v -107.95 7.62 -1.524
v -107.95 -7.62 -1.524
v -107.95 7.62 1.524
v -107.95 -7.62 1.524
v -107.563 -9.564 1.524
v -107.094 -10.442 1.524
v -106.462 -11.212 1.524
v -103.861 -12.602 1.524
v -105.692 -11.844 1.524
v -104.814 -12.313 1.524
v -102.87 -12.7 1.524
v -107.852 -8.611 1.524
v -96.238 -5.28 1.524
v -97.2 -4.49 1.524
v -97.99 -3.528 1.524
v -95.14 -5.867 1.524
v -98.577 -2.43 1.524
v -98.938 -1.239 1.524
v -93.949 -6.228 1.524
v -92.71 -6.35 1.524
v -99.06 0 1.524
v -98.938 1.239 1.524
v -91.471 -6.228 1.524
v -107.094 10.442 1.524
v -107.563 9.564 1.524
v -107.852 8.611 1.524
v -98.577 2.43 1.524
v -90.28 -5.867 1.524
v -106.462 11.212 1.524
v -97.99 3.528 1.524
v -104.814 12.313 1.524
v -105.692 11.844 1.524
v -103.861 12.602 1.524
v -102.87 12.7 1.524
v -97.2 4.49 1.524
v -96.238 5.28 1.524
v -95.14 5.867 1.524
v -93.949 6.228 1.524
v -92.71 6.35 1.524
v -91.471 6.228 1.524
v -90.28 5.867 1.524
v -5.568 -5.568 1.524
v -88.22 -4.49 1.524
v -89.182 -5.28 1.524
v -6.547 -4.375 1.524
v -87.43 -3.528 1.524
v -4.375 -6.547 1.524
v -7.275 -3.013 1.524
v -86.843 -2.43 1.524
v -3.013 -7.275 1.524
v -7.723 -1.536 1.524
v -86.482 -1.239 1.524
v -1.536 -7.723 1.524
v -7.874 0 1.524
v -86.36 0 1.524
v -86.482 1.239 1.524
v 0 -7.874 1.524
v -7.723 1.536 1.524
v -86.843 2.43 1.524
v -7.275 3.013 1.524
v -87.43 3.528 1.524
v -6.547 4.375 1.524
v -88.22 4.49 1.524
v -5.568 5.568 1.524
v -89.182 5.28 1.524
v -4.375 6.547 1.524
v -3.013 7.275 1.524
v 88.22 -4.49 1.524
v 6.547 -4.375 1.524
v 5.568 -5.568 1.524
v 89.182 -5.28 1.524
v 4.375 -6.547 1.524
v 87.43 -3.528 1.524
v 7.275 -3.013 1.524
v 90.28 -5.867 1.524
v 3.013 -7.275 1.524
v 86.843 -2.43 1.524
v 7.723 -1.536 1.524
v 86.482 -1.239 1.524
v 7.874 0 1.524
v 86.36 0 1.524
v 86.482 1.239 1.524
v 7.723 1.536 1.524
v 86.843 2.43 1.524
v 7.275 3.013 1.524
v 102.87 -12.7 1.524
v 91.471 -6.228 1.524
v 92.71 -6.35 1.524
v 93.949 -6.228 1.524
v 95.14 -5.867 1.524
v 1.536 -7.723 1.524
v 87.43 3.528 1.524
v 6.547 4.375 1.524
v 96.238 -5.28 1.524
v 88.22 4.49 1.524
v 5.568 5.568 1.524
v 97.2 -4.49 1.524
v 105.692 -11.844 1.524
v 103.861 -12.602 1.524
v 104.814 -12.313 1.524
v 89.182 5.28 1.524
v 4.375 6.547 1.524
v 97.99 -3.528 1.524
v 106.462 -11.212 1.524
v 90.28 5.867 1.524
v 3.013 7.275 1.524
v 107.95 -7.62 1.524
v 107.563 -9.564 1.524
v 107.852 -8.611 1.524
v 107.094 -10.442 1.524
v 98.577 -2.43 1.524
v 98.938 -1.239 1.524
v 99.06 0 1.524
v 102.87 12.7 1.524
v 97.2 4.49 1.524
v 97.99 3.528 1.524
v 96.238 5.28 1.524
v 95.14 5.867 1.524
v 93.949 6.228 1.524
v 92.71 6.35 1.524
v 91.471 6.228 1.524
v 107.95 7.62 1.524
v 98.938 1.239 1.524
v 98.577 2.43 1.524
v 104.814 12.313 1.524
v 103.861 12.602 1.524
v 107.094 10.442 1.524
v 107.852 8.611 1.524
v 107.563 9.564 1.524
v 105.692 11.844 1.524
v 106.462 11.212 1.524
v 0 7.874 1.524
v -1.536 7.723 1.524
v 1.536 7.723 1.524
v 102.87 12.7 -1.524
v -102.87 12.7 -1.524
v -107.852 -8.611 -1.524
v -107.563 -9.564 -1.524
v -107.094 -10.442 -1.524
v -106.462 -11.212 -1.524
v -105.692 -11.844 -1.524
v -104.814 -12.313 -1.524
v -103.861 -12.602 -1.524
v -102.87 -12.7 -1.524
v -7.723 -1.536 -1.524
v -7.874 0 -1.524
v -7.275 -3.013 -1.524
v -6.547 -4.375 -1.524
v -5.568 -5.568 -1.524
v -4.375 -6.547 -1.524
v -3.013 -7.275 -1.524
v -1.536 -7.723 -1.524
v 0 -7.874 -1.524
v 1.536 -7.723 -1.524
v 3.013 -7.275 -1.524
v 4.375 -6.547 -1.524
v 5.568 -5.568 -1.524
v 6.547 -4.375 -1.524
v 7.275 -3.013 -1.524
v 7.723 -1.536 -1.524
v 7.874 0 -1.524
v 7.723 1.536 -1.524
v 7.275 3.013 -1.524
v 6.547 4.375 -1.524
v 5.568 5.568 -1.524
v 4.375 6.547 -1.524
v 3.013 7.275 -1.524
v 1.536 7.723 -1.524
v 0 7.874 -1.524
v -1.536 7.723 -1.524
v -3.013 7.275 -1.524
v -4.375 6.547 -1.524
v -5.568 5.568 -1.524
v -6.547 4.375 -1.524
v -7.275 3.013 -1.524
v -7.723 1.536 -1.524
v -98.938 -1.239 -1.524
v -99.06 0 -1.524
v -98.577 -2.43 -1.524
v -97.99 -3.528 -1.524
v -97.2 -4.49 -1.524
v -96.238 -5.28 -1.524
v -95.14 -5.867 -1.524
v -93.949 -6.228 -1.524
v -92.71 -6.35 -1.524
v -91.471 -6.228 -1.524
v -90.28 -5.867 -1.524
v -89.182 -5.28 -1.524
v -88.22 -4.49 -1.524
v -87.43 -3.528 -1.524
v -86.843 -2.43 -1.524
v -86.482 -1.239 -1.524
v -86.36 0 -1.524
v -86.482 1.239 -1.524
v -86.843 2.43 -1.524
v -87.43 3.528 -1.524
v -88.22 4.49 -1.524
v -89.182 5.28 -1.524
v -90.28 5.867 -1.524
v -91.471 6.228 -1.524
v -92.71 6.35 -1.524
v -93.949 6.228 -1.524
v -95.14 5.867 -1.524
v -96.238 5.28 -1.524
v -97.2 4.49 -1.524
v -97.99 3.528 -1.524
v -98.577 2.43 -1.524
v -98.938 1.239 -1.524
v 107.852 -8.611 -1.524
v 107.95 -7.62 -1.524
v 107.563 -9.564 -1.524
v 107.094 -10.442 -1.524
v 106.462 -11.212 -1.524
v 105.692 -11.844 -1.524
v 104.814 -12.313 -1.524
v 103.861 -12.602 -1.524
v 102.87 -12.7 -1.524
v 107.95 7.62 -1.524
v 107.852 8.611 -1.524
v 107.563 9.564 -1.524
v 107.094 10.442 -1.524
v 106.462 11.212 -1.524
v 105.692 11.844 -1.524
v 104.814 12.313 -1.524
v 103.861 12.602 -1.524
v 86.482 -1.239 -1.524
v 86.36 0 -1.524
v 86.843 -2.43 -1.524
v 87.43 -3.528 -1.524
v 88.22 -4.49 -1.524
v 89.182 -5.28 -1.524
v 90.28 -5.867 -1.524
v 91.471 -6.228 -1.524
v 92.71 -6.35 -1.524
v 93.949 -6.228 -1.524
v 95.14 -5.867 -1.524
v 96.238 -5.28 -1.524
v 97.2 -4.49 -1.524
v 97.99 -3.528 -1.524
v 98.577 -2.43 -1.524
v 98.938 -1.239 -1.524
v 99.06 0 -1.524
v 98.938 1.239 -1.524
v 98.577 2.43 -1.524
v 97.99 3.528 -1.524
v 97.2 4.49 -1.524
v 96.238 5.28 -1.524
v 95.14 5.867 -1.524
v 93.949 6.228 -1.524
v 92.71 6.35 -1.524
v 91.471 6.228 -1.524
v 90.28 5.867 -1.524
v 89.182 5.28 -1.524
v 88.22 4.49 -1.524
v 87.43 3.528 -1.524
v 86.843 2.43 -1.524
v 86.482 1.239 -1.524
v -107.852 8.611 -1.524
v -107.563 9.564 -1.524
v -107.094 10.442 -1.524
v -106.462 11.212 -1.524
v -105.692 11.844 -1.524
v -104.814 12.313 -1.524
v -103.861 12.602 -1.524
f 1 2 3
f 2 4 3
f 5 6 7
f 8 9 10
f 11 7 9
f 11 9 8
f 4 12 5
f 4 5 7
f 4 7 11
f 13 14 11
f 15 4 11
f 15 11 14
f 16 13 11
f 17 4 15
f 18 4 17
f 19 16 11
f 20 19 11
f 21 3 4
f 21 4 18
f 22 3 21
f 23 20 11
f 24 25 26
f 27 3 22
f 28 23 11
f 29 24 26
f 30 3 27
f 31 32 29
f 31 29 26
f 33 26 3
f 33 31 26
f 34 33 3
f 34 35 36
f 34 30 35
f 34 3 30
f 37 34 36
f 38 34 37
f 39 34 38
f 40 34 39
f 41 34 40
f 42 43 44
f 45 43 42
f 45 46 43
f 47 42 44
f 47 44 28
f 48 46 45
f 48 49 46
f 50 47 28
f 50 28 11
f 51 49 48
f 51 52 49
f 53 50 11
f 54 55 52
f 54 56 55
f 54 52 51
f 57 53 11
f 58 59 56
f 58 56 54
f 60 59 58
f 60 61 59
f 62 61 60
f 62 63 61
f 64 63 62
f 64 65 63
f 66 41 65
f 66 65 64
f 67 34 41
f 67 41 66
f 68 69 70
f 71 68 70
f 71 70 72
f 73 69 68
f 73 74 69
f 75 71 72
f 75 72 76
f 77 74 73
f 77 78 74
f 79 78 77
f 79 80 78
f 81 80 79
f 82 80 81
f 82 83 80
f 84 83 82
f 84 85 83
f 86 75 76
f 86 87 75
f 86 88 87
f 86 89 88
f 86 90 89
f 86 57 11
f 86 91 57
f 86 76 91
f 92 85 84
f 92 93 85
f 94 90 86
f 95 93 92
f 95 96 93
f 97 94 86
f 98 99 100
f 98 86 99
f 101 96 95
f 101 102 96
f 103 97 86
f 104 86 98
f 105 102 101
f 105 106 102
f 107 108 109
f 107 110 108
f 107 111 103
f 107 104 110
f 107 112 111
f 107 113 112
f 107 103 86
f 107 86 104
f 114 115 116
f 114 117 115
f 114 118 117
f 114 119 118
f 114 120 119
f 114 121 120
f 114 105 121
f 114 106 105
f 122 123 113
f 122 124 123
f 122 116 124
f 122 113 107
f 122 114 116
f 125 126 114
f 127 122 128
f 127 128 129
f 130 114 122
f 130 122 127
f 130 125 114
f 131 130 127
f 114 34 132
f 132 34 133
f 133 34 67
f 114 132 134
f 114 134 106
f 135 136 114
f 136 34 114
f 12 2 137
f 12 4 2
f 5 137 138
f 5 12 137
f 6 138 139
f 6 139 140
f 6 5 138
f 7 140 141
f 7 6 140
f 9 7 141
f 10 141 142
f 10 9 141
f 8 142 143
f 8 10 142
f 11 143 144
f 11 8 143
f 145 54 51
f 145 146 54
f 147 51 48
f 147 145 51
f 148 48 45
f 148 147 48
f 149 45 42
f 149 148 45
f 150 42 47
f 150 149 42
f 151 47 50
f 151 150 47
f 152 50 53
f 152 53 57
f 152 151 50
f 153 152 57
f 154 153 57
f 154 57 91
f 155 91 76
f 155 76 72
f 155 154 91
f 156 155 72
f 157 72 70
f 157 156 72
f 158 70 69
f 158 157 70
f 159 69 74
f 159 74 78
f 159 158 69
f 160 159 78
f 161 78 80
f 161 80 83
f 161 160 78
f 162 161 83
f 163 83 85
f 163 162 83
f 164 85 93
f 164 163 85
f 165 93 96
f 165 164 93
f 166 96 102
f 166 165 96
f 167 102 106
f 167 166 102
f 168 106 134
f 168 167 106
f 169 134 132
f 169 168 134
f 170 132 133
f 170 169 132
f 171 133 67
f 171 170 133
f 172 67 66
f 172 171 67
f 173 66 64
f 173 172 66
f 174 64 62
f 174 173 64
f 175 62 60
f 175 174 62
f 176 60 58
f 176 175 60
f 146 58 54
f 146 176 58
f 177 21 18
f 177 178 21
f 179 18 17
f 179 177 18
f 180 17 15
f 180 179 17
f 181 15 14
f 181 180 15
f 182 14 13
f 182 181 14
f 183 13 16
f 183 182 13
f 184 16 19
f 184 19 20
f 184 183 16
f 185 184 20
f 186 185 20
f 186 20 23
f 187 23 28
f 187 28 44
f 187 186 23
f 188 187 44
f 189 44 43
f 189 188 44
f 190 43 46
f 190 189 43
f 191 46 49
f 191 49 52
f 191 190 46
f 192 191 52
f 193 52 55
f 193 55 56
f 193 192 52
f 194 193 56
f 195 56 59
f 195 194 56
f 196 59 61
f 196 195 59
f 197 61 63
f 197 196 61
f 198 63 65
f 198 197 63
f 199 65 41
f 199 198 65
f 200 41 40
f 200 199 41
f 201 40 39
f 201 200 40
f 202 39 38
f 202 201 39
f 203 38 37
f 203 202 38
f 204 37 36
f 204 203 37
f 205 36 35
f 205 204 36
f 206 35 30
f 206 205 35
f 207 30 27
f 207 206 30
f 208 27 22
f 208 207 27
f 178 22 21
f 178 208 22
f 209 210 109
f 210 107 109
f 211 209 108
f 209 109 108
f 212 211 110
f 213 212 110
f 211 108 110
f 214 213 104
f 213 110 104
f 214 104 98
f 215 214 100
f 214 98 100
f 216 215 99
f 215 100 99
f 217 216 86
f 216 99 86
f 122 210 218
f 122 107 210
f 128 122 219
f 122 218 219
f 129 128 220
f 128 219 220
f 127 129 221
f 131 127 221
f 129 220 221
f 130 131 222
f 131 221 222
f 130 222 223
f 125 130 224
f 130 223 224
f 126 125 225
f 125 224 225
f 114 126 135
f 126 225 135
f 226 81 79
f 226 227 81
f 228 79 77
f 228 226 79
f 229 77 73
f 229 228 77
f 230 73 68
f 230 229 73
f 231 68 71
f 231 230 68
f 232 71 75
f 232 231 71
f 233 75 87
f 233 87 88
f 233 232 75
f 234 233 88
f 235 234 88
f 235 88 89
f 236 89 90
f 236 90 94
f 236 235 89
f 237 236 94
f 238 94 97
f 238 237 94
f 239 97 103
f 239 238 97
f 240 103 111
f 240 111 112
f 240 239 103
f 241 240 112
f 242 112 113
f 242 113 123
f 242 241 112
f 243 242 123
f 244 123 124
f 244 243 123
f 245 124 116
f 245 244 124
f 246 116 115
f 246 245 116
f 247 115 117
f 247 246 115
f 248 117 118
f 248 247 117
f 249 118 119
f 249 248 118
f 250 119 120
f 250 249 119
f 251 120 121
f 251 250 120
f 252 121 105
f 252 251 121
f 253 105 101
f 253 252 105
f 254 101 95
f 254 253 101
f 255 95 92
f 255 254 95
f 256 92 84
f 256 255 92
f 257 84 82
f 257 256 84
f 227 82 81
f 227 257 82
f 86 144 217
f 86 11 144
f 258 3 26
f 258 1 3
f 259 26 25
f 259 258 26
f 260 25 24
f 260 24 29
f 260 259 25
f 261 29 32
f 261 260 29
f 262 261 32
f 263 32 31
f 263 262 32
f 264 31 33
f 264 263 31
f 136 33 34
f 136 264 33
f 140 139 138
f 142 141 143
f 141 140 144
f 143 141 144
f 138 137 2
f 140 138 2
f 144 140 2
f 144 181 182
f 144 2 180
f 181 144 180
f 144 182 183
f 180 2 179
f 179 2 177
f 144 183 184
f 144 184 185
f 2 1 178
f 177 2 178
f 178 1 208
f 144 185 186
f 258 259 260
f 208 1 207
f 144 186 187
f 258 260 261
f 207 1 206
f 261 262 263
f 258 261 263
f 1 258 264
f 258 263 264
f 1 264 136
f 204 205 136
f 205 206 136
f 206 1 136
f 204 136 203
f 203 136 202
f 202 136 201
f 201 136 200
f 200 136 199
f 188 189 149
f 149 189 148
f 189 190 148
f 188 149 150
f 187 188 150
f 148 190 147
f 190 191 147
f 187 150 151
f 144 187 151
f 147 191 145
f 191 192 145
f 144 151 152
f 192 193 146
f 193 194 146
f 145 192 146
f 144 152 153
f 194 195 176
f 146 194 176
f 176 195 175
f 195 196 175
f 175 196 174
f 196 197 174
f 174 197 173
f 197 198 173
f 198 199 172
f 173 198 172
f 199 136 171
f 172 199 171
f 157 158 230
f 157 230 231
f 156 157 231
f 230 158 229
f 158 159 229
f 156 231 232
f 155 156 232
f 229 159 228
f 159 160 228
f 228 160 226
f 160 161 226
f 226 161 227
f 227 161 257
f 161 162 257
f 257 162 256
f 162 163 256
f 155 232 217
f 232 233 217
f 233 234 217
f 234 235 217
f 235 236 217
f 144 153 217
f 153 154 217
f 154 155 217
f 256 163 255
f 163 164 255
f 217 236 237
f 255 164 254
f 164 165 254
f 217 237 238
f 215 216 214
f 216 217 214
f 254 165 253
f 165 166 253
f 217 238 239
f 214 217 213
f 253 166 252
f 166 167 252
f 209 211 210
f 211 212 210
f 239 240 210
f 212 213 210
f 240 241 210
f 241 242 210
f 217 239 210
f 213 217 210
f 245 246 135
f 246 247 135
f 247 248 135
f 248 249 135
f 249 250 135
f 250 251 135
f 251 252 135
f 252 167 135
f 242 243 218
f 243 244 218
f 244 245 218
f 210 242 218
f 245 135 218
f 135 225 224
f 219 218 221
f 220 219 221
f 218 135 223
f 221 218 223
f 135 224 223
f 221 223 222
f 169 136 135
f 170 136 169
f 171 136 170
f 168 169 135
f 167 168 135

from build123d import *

# Parameters (mm, degrees)
SKETCH1_W      = 215.9
SKETCH1_H      = 25.4
SKETCH1_R      = 6.35
SKETCH1_R_2    = 7.874
EXTRUDE1_DEPTH = 1.524
FILLET1_R      = 5.08


with BuildPart() as part:
    # Sketch1 → Extrude1 (new, symmetric)
    with BuildSketch(Plane.XY):
        Rectangle(SKETCH1_W, SKETCH1_H)
        with Locations(Location((92.71, 0, 0), (0, 0, 180))):
            Circle(SKETCH1_R, mode=Mode.SUBTRACT)
        with Locations(Location((0, 0, 0), (0, 0, 180))):
            Circle(SKETCH1_R_2, mode=Mode.SUBTRACT)
        with Locations(Location((-92.71, 0, 0), (0, 0, 180))):
            Circle(SKETCH1_R, mode=Mode.SUBTRACT)
    extrude(amount=EXTRUDE1_DEPTH, both=True)

    # Fillet1
    fillet1_edges = [part.edges().sort_by_distance(p)[0] for p in [
        (-107.95, 12.7, 0),
        (107.95, 12.7, 0),
        (107.95, -12.7, 0),
        (-107.95, -12.7, 0),
    ]]
    fillet(fillet1_edges, radius=FILLET1_R)


solid = part.part
